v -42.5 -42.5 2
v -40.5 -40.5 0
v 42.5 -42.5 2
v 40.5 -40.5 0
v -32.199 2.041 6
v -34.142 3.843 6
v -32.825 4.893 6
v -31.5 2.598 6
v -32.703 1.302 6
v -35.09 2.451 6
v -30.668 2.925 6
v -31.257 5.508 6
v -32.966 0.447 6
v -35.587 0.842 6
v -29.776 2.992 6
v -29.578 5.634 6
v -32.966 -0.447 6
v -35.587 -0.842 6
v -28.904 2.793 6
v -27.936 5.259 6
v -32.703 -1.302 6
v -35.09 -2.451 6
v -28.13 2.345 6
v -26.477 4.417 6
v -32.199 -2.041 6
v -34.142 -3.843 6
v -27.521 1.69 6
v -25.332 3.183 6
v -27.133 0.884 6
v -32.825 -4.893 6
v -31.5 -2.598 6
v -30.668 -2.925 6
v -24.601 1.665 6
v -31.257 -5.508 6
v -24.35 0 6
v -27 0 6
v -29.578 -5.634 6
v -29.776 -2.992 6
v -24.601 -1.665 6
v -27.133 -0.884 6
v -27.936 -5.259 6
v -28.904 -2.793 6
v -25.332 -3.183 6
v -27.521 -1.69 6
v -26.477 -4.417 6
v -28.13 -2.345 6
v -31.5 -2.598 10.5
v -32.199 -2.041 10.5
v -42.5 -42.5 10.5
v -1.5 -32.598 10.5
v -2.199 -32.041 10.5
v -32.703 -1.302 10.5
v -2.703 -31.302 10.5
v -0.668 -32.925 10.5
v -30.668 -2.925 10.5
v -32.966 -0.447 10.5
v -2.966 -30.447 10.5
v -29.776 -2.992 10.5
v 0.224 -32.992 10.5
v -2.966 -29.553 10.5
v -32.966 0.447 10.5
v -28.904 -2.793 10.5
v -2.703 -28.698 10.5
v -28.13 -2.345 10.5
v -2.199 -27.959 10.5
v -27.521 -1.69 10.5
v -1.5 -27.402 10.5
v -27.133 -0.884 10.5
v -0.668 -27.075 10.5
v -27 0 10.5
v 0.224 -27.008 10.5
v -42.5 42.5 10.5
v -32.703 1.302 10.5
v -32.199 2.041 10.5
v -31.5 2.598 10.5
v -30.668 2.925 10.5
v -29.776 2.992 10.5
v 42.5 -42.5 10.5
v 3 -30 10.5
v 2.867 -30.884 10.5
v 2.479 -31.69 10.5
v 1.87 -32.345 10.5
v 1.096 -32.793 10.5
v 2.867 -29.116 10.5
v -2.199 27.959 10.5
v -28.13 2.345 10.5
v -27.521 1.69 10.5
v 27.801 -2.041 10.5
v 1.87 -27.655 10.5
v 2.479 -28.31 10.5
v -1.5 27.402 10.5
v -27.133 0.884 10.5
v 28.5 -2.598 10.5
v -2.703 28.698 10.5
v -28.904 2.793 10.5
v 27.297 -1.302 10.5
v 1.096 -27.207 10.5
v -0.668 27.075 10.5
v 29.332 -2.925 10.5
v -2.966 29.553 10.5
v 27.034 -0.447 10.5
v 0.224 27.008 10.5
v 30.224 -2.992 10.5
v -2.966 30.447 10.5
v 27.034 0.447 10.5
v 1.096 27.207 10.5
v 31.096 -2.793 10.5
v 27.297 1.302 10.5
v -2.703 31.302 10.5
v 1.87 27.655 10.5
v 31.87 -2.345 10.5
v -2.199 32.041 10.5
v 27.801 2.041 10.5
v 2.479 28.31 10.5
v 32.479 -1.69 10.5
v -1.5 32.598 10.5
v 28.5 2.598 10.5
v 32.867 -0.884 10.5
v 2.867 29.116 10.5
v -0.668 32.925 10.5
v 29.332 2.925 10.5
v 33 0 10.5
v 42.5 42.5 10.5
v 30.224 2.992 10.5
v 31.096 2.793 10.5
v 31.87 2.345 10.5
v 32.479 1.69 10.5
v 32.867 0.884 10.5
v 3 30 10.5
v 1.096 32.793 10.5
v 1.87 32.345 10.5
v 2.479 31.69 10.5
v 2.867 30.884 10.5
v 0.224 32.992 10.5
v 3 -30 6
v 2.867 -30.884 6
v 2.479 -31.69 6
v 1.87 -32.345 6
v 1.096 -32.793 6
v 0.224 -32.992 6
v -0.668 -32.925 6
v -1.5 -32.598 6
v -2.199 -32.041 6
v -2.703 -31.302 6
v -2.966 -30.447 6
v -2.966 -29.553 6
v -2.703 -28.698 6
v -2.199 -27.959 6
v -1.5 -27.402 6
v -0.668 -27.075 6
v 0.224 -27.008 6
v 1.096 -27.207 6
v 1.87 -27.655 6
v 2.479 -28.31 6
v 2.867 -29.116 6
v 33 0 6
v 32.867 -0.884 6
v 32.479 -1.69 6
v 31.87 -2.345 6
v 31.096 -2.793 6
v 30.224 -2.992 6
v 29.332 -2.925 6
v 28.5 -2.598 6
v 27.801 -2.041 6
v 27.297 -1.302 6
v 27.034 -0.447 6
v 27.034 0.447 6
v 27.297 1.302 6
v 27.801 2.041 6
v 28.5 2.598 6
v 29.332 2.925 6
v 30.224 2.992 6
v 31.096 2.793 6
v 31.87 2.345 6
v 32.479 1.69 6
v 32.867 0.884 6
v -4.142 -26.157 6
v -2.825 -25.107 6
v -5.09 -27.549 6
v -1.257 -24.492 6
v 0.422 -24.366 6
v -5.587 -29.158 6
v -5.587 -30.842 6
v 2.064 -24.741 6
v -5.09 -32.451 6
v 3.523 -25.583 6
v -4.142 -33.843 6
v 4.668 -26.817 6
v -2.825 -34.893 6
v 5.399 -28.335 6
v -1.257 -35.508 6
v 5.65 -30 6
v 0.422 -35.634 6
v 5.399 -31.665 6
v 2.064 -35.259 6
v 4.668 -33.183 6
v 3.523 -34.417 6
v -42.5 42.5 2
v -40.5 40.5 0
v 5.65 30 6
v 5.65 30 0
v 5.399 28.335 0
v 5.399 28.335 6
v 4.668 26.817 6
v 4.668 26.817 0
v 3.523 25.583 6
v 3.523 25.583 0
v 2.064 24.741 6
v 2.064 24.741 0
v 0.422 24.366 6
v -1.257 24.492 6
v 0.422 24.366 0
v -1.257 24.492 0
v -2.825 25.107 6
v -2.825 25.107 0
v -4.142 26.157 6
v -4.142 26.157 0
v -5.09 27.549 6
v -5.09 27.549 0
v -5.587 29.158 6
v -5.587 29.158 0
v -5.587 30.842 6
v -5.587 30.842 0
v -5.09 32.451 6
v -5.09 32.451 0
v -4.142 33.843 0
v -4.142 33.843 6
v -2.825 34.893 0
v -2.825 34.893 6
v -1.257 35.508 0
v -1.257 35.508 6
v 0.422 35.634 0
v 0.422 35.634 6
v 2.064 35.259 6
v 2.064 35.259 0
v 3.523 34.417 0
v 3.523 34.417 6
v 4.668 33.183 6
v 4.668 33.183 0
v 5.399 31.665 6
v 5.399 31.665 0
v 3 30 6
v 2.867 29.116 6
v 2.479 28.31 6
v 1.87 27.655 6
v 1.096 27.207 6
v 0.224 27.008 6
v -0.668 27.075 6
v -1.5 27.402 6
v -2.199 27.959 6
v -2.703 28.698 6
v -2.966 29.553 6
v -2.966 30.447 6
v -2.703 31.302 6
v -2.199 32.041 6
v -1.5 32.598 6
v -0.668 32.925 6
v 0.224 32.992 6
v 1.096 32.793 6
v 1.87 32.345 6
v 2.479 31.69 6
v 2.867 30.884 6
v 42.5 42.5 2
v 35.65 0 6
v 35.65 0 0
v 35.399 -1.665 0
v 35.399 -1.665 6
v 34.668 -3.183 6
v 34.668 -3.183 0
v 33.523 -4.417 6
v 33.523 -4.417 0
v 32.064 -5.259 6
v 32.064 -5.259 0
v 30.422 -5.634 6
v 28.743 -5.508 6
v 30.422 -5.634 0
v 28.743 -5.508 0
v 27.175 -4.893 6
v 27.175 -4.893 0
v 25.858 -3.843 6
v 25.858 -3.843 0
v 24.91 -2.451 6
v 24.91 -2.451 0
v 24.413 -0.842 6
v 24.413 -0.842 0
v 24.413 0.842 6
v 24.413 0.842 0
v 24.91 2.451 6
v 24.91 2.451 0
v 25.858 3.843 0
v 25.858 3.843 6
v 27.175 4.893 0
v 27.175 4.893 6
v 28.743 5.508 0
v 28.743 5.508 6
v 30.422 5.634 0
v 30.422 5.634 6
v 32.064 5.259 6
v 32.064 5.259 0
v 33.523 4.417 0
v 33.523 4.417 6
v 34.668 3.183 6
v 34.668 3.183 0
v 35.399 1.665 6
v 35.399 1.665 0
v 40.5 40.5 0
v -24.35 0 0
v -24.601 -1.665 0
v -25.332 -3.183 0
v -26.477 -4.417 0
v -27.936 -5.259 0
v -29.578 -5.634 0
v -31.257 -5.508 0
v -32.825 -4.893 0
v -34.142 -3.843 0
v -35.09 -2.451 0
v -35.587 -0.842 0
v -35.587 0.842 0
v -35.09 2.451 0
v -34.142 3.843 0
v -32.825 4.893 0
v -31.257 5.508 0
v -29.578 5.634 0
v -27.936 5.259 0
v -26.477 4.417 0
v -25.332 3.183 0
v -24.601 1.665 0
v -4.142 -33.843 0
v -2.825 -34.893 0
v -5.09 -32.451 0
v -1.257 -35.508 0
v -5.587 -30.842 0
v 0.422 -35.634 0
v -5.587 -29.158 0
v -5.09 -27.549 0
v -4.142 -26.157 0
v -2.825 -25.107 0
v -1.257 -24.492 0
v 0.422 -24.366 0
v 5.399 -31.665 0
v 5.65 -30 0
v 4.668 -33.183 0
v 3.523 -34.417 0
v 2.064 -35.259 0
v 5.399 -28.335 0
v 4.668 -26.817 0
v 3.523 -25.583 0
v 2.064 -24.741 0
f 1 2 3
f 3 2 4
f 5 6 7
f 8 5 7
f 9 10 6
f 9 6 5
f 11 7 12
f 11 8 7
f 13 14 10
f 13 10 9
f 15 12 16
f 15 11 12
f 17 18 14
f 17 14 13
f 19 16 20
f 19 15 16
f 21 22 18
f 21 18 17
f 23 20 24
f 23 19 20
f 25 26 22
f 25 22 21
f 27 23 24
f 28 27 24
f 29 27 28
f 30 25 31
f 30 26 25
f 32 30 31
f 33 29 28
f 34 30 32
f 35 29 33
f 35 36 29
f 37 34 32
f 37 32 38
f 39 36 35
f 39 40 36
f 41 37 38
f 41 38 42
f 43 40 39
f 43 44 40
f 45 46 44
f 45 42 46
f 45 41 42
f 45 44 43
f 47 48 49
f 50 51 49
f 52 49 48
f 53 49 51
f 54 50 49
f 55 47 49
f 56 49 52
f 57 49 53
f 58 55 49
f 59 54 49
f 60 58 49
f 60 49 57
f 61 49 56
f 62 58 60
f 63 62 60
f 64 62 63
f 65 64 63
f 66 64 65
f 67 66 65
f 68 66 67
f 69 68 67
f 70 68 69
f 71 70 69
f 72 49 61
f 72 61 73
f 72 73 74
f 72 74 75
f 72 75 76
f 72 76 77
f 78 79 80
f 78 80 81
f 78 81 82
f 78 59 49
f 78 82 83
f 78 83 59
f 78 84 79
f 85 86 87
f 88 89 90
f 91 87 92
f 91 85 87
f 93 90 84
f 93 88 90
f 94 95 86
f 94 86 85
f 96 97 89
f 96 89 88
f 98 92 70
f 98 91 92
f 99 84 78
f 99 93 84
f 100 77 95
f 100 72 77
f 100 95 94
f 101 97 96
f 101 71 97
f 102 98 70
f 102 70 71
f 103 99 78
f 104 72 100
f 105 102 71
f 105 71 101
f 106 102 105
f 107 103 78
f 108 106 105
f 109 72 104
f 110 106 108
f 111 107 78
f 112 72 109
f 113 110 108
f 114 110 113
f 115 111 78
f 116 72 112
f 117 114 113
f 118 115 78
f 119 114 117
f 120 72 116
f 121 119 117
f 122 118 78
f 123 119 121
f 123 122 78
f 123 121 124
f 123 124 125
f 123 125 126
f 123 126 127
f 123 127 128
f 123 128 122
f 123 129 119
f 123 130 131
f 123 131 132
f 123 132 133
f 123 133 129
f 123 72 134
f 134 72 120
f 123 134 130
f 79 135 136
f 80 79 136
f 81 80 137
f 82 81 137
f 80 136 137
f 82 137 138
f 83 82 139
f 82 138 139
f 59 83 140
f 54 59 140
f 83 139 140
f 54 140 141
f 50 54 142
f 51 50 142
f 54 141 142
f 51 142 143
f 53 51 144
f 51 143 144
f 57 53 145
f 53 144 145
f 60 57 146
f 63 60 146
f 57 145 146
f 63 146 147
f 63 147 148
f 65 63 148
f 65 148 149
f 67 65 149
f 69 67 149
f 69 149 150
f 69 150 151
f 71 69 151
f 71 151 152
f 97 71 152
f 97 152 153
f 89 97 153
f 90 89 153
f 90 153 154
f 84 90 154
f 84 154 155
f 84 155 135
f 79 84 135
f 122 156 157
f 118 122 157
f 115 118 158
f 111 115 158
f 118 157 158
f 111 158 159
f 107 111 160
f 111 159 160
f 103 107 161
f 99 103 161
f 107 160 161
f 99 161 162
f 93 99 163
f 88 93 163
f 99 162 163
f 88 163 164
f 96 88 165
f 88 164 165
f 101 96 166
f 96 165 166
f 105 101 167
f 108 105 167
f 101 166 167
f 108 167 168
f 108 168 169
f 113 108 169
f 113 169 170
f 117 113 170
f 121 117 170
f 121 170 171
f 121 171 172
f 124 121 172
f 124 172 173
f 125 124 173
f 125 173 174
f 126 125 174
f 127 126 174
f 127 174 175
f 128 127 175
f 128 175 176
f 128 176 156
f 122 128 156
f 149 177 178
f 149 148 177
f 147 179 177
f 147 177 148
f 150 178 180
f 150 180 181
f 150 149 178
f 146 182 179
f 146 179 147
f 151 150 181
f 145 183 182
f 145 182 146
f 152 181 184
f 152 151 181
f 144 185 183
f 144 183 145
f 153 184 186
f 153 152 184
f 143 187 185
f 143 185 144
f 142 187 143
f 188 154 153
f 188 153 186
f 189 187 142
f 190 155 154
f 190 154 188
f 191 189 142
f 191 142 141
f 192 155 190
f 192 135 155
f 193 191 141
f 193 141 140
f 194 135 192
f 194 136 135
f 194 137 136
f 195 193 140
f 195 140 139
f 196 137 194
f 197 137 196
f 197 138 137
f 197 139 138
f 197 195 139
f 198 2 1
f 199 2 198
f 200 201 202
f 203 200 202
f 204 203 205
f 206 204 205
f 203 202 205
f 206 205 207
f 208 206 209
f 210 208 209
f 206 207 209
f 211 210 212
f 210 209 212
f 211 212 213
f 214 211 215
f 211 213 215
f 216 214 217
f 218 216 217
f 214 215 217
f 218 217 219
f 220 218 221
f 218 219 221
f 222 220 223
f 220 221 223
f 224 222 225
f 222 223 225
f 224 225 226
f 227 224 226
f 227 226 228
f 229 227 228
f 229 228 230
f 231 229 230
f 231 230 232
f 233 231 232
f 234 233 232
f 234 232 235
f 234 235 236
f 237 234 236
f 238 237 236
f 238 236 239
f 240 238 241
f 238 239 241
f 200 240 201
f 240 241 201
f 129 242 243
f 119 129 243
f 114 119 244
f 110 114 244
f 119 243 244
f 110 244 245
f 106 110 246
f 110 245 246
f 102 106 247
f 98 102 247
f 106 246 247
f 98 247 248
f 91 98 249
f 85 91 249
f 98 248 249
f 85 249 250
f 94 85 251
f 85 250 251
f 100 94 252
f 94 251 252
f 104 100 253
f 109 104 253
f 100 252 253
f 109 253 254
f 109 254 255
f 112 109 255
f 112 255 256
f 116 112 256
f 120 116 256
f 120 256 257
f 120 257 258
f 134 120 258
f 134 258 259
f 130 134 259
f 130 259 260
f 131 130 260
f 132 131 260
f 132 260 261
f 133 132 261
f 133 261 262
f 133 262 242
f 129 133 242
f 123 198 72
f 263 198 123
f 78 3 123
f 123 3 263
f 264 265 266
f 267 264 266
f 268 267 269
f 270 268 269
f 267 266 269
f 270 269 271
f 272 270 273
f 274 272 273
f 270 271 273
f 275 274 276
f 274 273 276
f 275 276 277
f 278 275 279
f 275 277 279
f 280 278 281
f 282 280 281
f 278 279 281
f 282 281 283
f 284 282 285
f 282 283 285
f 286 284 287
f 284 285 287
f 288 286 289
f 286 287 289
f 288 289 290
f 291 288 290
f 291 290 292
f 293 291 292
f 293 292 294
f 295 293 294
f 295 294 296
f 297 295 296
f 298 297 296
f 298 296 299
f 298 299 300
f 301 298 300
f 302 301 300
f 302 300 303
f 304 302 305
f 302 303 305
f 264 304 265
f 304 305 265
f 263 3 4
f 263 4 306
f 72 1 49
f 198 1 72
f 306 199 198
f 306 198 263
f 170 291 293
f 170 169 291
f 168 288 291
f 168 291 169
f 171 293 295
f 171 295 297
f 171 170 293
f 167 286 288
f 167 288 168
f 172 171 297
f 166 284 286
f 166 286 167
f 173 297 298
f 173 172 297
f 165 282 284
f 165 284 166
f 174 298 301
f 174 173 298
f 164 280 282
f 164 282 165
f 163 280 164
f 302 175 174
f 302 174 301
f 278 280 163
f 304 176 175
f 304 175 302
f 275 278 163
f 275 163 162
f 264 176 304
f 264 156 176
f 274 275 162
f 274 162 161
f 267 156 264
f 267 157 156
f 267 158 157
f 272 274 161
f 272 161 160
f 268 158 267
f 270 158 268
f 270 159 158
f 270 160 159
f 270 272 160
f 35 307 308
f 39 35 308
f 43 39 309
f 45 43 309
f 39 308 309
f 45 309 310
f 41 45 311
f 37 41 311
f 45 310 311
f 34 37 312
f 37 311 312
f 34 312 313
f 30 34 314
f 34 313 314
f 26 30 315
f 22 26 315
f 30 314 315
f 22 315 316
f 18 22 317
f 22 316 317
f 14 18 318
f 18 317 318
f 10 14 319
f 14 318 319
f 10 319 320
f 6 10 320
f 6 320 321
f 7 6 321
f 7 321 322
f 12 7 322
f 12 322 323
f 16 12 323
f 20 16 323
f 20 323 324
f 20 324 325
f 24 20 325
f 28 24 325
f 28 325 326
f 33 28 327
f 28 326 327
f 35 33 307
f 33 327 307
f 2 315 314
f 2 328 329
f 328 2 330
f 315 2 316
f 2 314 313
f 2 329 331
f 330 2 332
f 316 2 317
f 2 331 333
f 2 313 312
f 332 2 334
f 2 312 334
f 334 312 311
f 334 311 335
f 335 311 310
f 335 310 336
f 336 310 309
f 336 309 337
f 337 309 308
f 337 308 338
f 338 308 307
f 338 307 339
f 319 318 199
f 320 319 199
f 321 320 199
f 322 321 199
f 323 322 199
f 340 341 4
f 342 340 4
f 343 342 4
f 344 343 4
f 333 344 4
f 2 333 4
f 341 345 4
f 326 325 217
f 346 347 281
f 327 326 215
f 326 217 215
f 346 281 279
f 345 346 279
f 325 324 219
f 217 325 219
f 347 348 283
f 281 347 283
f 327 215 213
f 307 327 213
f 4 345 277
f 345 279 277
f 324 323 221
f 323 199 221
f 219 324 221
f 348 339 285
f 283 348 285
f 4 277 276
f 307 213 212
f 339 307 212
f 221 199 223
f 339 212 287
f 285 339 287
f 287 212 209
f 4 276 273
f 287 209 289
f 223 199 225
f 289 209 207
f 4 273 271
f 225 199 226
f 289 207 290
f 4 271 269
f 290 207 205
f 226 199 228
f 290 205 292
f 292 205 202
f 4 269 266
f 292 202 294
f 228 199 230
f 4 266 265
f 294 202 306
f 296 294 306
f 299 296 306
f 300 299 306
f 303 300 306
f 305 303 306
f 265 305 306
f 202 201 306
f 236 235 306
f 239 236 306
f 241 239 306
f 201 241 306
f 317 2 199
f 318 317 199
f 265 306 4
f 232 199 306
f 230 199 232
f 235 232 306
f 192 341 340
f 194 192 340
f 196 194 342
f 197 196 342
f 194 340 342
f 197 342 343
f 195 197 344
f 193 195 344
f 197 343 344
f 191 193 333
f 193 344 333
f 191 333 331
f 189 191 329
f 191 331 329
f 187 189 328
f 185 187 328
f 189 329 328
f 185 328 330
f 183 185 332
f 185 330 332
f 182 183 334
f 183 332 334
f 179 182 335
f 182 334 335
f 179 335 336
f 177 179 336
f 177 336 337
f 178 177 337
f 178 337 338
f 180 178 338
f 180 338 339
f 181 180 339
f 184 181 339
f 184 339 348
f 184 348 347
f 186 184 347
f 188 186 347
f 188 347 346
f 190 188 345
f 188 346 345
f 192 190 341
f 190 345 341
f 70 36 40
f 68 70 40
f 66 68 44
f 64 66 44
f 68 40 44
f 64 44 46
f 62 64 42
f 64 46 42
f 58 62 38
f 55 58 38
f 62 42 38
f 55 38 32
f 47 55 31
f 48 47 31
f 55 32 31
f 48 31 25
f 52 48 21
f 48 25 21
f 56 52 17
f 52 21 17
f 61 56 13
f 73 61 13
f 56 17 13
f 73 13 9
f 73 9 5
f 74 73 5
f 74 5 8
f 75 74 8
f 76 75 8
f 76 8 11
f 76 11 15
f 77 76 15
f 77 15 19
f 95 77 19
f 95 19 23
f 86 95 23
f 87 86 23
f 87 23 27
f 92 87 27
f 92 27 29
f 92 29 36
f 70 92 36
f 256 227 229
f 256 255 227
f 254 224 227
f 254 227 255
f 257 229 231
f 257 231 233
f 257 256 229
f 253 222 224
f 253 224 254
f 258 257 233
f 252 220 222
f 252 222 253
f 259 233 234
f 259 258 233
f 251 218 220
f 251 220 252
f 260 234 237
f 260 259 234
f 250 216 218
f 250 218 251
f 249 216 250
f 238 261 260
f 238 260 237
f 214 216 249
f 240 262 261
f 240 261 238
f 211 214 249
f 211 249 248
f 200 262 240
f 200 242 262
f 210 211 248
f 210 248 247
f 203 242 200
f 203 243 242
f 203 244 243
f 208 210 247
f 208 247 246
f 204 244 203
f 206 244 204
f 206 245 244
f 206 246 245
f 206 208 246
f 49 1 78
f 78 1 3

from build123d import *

# Parameters (mm, degrees)
F0_W     = 85
F0_H     = 85
F1_DEPTH = 10.5
F4_R     = 3
F5_DEPTH = 25
F6_R     = 5.65
F6_R_2   = 3
F7_DEPTH = 6
F8_SIZE  = 2


with BuildPart() as f1:
    # F0 (on Top) → F1 (new body)
    with BuildSketch(Plane.XY):
        Rectangle(F0_W, F0_H)
    extrude(amount=F1_DEPTH)

    # F4 (on face) → F5 (cut)
    with BuildSketch(Plane(origin=(0, 0, 0), x_dir=(1, 0, 0), z_dir=(0, 0, -1))):
        with Locations((0, 30)):
            Circle(F4_R)
        with Locations((0, -30)):
            Circle(F4_R)
        with Locations((30, 0)):
            Circle(F4_R)
        with Locations((-30, 0)):
            Circle(F4_R)
    extrude(amount=-F5_DEPTH, mode=Mode.SUBTRACT)

    # F6 (on face) → F7 (cut)
    with BuildSketch(Plane(origin=(0, 0, 0), x_dir=(1, 0, 0), z_dir=(0, 0, -1))):
        with Locations((0, 30)):
            Circle(F6_R)
        with Locations((0, 30)):
            Circle(F6_R_2, mode=Mode.SUBTRACT)
        with Locations((30, 0)):
            Circle(F6_R)
        with Locations((30, 0)):
            Circle(F6_R_2, mode=Mode.SUBTRACT)
        with Locations((0, -30)):
            Circle(F6_R)
        with Locations((0, -30)):
            Circle(F6_R_2, mode=Mode.SUBTRACT)
        with Locations((-30, 0)):
            Circle(F6_R)
        with Locations((-30, 0)):
            Circle(F6_R_2, mode=Mode.SUBTRACT)
    extrude(amount=-F7_DEPTH, mode=Mode.SUBTRACT)

    # F8
    f8_edges = [f1.edges().sort_by_distance(p)[0] for p in [
        (-42.5, 0, 0),
        (0, -42.5, 0),
        (42.5, 0, 0),
        (0, 42.5, 0),
    ]]
    chamfer(f8_edges, length=F8_SIZE)


solid = f1.part
